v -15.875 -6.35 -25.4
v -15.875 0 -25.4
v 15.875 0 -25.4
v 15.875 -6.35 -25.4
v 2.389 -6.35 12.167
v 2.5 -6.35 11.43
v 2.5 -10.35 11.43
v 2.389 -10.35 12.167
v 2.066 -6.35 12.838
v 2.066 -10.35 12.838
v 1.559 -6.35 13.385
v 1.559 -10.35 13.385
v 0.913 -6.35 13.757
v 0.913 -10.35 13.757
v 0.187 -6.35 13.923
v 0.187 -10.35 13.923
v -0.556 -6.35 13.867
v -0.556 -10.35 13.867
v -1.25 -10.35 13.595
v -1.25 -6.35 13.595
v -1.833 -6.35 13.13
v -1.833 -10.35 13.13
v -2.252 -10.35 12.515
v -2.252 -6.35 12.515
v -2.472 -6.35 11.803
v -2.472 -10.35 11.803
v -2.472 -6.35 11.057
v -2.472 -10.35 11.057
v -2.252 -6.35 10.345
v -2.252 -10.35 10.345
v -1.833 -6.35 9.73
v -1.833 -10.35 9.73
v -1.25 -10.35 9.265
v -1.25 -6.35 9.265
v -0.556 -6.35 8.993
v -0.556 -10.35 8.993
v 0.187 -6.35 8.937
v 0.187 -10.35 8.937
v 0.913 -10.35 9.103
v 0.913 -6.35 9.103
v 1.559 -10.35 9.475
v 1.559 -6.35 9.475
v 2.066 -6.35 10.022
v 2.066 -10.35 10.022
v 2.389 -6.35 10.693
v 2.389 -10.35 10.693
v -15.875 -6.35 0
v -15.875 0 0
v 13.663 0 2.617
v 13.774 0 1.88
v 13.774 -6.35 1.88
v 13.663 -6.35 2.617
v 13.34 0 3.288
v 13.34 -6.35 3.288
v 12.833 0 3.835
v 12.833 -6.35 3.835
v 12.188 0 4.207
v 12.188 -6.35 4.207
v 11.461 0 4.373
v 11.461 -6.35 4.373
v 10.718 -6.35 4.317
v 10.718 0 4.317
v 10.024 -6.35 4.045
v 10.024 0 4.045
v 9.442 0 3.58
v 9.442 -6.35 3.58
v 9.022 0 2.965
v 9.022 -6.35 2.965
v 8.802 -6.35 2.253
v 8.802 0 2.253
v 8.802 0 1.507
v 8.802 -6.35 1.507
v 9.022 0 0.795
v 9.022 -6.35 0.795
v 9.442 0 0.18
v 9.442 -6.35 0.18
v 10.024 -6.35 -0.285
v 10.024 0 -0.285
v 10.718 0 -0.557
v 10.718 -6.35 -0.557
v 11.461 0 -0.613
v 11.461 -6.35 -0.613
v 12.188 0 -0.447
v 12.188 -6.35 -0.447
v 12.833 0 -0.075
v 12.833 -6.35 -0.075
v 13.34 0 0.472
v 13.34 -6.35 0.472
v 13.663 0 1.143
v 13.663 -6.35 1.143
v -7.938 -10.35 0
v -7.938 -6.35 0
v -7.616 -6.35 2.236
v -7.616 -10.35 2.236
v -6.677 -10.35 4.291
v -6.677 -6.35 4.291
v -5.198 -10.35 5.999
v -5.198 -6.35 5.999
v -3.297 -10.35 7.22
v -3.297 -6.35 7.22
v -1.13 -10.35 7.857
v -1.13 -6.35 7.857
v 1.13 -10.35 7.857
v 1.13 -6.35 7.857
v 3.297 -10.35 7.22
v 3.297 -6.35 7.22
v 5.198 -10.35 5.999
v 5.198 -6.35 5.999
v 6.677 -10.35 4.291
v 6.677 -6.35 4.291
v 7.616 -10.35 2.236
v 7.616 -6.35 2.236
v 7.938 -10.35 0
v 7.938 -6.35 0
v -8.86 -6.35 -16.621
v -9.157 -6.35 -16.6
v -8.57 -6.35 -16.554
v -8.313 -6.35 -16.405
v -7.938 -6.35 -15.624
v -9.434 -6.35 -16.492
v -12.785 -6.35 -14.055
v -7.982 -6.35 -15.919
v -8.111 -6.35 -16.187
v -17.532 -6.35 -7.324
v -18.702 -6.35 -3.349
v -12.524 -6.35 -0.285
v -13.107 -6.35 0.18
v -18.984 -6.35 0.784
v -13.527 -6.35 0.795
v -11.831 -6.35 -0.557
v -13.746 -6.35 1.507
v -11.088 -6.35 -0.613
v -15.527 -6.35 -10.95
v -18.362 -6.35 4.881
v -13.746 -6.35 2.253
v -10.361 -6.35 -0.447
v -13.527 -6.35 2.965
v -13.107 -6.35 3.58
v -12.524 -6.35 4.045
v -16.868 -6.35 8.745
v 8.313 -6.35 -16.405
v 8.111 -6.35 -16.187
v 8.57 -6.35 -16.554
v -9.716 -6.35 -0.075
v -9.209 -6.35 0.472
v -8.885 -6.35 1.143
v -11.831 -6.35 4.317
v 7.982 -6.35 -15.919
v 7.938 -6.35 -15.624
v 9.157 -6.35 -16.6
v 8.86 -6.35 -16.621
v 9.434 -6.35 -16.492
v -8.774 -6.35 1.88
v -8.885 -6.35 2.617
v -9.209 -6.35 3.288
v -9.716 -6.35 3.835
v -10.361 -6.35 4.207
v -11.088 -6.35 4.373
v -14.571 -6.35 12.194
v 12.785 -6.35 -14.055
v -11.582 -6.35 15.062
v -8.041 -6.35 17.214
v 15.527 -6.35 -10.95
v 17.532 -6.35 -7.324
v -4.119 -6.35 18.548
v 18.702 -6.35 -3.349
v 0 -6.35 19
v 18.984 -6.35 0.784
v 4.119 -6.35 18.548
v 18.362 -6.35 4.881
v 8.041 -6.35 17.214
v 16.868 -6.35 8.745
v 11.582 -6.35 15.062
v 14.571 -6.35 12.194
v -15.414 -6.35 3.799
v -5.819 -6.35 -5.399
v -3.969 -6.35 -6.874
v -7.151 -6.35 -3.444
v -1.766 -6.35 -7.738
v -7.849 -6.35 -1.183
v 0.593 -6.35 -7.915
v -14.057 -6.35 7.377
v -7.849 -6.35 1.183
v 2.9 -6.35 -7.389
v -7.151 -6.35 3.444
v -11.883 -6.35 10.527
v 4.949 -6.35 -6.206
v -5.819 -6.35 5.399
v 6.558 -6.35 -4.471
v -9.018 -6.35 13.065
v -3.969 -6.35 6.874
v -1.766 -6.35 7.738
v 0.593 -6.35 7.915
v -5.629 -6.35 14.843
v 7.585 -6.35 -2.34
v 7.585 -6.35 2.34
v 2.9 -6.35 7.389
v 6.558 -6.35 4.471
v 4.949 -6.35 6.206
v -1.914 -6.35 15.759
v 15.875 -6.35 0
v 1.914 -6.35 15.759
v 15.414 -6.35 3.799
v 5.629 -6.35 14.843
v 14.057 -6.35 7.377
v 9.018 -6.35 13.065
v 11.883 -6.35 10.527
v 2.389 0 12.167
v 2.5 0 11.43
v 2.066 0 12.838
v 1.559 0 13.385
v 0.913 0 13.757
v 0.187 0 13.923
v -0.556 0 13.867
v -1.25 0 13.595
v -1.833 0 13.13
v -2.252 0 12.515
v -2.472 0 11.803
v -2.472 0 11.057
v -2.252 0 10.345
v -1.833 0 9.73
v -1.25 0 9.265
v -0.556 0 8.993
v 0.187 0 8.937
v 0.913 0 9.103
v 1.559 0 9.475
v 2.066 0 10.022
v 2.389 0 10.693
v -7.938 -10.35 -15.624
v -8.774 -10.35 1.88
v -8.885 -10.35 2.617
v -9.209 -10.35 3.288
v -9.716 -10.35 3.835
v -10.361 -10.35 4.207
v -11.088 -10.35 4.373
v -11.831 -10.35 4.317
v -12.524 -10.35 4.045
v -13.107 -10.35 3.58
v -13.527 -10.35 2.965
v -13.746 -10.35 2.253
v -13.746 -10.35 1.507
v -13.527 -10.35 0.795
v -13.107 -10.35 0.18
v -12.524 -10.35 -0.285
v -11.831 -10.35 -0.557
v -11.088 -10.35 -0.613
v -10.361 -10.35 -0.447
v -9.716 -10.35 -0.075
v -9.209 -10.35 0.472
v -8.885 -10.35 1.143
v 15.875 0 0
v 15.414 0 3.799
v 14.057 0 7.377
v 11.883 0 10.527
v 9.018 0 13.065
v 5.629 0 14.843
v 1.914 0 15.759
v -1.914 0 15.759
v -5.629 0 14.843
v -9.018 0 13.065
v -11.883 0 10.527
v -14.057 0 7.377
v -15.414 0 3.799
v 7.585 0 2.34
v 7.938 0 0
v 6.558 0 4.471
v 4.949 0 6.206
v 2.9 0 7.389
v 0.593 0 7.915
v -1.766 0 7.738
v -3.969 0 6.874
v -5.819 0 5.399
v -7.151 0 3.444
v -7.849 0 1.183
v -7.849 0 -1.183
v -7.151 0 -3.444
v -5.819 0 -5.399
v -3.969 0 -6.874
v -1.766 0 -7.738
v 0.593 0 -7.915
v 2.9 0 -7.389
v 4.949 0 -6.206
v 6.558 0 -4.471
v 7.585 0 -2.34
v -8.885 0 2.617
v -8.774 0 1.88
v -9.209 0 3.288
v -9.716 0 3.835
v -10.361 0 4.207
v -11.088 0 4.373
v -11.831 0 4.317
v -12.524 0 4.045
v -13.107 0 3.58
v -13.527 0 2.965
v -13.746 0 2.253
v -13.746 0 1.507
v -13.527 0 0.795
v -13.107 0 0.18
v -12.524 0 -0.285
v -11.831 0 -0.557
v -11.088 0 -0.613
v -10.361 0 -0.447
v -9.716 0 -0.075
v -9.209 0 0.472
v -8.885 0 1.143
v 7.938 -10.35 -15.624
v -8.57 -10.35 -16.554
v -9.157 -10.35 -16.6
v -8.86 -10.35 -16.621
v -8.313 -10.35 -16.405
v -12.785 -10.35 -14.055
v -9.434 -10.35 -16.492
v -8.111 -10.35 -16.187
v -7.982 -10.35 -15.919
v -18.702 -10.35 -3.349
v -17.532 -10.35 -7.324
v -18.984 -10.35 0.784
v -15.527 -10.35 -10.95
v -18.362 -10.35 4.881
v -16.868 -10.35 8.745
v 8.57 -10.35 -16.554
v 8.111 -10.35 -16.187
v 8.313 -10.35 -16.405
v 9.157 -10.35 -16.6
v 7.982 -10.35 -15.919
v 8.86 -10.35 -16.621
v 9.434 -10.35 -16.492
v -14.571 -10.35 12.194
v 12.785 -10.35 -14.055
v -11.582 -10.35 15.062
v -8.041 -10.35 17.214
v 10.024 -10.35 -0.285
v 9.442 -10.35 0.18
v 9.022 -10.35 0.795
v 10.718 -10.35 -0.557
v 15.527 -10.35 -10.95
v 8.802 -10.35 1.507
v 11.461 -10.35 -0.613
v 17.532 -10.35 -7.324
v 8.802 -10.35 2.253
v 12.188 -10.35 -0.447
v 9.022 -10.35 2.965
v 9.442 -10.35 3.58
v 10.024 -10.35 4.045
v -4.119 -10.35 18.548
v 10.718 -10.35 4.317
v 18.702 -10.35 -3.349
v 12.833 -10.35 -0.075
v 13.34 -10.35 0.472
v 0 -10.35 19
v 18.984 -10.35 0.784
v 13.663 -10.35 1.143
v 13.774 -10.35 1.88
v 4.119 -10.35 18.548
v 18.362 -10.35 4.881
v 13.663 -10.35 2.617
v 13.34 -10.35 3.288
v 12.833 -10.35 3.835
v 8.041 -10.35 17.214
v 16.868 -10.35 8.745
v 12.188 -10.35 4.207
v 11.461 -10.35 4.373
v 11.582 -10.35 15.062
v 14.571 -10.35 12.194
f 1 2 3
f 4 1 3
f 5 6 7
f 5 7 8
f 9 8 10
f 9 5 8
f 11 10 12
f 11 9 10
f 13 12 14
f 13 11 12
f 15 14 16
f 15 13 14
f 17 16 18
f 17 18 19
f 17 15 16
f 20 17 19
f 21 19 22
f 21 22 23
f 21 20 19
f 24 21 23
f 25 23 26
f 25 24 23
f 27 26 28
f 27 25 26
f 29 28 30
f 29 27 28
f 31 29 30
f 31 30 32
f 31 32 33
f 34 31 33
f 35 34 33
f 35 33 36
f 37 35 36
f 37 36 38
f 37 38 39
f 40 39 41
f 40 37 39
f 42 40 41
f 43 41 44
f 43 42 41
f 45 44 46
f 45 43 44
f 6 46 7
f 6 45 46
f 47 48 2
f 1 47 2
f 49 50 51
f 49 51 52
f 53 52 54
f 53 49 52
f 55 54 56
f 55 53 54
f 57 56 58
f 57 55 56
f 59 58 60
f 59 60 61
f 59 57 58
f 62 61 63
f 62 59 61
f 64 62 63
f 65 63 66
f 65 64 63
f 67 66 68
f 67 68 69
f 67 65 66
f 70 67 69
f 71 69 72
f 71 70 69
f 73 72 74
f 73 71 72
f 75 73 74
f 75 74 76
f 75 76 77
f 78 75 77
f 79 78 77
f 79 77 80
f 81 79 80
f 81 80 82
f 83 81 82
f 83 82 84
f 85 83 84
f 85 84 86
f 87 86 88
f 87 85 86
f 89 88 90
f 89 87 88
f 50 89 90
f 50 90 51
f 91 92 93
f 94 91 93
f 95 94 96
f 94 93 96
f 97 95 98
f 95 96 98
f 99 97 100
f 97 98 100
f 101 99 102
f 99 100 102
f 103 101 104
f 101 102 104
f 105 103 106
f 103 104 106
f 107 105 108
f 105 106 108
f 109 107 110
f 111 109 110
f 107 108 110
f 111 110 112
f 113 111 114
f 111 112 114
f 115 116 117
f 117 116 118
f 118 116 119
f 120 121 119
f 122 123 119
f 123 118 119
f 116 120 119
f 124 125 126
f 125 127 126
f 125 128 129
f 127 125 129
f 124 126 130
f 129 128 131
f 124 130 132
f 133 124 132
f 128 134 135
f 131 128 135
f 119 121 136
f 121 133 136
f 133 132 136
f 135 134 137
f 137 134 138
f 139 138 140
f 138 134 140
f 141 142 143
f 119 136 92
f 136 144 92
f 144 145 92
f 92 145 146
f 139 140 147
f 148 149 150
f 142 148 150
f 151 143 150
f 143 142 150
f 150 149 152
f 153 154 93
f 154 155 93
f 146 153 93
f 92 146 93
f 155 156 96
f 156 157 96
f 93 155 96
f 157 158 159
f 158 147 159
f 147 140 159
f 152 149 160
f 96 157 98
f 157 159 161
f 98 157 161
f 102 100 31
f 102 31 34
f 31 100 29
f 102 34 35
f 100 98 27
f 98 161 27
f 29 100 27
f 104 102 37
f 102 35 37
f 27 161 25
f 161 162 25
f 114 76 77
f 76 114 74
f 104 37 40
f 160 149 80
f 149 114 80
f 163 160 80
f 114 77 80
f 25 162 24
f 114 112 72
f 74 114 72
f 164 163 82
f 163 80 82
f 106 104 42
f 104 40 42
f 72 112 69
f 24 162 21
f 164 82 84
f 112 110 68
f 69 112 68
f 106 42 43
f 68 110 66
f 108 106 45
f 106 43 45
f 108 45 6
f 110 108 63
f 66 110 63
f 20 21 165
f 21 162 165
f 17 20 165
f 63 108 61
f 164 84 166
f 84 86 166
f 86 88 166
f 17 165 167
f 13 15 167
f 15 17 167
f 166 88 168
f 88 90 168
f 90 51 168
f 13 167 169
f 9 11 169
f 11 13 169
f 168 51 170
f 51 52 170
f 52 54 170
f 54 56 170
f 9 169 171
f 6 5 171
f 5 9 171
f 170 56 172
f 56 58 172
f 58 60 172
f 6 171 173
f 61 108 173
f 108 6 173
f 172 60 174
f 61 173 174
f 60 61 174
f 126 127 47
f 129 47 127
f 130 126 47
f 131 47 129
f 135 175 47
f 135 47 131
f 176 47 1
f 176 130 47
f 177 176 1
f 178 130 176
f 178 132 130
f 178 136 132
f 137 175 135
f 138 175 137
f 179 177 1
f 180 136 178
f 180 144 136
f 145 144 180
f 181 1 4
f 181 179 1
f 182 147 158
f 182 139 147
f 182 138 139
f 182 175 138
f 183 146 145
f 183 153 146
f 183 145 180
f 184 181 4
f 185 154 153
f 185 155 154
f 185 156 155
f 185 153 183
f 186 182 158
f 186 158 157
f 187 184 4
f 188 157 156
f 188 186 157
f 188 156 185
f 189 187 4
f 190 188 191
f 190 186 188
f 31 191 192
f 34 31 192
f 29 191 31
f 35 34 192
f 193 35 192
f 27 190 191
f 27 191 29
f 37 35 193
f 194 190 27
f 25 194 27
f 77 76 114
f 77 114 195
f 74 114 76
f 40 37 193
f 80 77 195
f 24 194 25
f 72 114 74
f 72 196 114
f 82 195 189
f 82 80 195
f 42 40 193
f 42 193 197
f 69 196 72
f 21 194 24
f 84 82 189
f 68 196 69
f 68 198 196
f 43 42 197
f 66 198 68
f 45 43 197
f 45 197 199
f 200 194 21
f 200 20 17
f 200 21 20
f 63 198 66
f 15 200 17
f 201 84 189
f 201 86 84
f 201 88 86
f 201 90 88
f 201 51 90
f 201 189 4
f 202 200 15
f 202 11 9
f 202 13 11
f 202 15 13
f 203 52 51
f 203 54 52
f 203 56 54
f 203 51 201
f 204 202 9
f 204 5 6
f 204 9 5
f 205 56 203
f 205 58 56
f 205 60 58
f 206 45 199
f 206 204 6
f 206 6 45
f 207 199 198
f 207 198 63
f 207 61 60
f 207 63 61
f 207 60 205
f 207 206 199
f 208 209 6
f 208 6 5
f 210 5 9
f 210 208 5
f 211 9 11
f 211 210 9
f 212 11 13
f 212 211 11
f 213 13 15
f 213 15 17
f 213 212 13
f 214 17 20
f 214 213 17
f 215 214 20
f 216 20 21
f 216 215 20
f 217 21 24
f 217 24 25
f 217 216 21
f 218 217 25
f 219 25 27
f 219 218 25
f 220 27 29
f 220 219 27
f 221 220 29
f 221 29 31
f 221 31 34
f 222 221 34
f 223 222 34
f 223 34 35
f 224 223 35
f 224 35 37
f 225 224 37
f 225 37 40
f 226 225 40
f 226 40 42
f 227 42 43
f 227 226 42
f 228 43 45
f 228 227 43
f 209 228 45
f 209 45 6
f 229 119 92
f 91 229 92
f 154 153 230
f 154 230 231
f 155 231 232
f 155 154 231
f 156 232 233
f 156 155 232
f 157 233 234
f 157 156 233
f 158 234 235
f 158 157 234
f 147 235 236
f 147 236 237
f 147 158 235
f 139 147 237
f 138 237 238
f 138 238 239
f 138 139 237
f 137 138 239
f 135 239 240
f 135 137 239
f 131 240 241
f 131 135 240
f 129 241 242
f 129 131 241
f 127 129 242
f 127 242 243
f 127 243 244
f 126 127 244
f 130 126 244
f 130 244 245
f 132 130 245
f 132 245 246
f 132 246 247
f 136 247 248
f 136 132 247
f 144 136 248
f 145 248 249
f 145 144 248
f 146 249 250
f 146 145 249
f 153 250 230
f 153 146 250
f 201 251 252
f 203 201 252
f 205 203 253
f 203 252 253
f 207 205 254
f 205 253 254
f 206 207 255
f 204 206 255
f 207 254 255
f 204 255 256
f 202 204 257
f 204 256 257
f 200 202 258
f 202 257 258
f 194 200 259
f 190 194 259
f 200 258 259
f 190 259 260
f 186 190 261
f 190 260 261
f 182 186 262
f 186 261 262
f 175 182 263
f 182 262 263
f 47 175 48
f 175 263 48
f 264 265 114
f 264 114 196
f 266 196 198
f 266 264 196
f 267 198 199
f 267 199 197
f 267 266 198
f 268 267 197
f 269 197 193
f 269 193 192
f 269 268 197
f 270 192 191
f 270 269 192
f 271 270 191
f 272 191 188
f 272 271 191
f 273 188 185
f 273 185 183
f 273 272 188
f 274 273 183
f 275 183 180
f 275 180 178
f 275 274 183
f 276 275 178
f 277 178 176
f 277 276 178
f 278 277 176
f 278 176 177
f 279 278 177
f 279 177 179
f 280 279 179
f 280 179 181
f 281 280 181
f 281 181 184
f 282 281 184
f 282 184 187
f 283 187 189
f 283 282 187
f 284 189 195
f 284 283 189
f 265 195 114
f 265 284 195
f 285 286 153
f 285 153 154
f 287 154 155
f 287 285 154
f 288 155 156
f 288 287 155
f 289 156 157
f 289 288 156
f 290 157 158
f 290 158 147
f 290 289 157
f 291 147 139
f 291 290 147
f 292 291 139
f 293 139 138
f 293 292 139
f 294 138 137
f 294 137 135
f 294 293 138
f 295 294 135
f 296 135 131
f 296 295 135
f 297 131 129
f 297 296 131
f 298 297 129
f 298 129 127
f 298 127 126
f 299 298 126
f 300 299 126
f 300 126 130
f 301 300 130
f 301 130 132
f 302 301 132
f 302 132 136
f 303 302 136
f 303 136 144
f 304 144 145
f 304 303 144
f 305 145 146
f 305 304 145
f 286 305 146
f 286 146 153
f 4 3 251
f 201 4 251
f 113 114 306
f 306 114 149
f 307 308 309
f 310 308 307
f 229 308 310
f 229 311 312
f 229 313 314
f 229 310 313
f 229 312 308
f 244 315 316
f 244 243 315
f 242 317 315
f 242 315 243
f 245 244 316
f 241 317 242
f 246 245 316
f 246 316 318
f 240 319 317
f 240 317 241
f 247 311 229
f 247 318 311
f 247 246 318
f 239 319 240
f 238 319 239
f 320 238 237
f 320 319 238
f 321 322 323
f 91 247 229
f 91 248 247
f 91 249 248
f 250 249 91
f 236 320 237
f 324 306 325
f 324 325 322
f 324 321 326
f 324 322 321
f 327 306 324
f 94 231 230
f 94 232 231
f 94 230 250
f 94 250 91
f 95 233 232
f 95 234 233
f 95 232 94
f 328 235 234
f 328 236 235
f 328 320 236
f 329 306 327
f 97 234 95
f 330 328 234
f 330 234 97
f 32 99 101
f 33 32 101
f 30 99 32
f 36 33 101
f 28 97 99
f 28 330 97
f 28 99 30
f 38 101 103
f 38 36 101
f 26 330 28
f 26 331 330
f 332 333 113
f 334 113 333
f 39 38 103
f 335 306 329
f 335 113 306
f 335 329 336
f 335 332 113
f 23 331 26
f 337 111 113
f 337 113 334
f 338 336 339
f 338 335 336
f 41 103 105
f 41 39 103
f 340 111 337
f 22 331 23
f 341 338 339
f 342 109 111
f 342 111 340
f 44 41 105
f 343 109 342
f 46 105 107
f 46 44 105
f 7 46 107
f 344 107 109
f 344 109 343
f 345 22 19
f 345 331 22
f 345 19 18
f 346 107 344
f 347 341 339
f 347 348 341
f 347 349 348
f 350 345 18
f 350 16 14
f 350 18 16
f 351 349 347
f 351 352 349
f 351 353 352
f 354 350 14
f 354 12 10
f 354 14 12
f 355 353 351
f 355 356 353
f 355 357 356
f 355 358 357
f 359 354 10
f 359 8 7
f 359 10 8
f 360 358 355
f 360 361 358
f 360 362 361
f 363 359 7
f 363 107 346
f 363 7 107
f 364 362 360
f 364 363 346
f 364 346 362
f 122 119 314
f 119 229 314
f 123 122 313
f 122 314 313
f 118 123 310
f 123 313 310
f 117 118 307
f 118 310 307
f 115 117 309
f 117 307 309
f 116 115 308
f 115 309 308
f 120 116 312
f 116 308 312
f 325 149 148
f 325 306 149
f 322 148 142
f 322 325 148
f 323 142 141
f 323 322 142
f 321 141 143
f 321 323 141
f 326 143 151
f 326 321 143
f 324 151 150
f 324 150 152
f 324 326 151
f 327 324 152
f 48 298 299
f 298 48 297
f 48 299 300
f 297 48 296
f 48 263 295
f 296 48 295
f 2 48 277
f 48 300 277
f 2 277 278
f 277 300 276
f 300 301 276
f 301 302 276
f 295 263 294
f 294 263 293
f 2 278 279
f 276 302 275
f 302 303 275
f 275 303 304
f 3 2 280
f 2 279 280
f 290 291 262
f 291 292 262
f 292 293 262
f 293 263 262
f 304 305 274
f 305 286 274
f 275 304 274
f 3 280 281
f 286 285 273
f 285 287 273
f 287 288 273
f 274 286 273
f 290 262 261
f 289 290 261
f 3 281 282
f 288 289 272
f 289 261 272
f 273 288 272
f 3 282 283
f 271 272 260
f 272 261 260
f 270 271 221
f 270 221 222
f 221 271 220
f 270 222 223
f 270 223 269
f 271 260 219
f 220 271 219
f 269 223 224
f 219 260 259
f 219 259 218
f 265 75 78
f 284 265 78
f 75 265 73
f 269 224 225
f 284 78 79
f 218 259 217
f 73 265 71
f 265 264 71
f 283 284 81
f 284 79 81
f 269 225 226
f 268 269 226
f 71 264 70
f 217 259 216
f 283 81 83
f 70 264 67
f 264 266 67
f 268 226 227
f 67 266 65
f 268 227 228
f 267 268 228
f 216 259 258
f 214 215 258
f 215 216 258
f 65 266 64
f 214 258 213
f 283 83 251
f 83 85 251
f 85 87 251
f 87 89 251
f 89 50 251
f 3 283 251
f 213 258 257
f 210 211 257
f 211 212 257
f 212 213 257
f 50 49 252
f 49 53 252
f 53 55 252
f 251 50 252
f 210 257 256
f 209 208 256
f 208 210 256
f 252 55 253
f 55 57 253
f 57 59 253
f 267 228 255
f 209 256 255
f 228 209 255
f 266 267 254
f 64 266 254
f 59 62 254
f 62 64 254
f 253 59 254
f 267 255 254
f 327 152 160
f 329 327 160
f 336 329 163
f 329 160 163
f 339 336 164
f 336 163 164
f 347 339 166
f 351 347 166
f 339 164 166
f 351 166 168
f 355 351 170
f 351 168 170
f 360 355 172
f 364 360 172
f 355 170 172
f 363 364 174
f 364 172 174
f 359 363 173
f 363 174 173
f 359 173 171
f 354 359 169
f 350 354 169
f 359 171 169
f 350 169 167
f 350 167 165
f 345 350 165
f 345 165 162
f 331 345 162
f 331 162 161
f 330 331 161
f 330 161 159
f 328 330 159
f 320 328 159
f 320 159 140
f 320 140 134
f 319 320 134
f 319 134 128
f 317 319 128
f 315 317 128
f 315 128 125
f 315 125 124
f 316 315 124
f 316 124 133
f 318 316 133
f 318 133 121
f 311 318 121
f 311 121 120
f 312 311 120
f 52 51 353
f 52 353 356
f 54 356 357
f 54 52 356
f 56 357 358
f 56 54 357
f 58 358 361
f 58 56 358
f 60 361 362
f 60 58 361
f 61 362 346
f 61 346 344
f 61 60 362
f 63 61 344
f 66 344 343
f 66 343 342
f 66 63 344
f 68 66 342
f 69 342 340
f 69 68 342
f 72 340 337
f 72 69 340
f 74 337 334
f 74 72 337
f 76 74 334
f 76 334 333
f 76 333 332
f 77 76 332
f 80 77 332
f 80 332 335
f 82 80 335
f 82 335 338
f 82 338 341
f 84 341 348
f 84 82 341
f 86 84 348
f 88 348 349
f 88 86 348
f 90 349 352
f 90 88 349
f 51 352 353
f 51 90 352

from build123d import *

# Parameters (mm, degrees)
F0_R     = 2.5
F0_R_2   = 7.9375
F1_DEPTH = 6.35
F2_R     = 2.5
F3_DEPTH = 4
F4_R     = 1


with BuildPart() as f1:
    # F0 (on Front) → F1 (new body)
    with BuildSketch(Plane.XZ):
        with BuildLine():
            Line((15.875, -25.4), (15.875, 0))
            ThreePointArc((15.875, 0), (0, 15.875), (-15.875, 0))
            Line((-15.875, 0), (-15.875, -25.4))
            Line((-15.875, -25.4), (15.875, -25.4))
        make_face()
        with Locations((-11.274329, 1.88)):
            Circle(F0_R, mode=Mode.SUBTRACT)
        Circle(F0_R_2, mode=Mode.SUBTRACT)
        with Locations((11.274329, 1.88)):
            Circle(F0_R, mode=Mode.SUBTRACT)
        with Locations((0, 11.43)):
            Circle(F0_R, mode=Mode.SUBTRACT)
    extrude(amount=F1_DEPTH)


with BuildPart() as f3:
    # F2 (on face) → F3 (new body)
    with BuildSketch(Plane.XZ.offset(6.35)):
        with BuildLine():
            ThreePointArc((-7.9375, 0), (0, 7.9375), (7.9375, 0))
            Line((7.9375, 0), (7.9375, -17.262563))
            ThreePointArc((7.9375, -17.262563), (0, 19), (-7.9375, -17.262563))
            Line((-7.9375, -17.262563), (-7.9375, 0))
        make_face()
        with Locations((-11.274329, 1.88)):
            Circle(F2_R, mode=Mode.SUBTRACT)
        with Locations((11.274329, 1.88)):
            Circle(F2_R, mode=Mode.SUBTRACT)
        with Locations((0, 11.43)):
            Circle(F2_R, mode=Mode.SUBTRACT)
    extrude(amount=F3_DEPTH)

    # F4
    f4_edges = [f3.edges().sort_by_distance(p)[0] for p in [
        (7.9375, -8.35, -17.262563),
        (-7.9375, -8.35, -17.262563),
    ]]
    fillet(f4_edges, radius=F4_R)


solid = Compound([f1.part, f3.part])
